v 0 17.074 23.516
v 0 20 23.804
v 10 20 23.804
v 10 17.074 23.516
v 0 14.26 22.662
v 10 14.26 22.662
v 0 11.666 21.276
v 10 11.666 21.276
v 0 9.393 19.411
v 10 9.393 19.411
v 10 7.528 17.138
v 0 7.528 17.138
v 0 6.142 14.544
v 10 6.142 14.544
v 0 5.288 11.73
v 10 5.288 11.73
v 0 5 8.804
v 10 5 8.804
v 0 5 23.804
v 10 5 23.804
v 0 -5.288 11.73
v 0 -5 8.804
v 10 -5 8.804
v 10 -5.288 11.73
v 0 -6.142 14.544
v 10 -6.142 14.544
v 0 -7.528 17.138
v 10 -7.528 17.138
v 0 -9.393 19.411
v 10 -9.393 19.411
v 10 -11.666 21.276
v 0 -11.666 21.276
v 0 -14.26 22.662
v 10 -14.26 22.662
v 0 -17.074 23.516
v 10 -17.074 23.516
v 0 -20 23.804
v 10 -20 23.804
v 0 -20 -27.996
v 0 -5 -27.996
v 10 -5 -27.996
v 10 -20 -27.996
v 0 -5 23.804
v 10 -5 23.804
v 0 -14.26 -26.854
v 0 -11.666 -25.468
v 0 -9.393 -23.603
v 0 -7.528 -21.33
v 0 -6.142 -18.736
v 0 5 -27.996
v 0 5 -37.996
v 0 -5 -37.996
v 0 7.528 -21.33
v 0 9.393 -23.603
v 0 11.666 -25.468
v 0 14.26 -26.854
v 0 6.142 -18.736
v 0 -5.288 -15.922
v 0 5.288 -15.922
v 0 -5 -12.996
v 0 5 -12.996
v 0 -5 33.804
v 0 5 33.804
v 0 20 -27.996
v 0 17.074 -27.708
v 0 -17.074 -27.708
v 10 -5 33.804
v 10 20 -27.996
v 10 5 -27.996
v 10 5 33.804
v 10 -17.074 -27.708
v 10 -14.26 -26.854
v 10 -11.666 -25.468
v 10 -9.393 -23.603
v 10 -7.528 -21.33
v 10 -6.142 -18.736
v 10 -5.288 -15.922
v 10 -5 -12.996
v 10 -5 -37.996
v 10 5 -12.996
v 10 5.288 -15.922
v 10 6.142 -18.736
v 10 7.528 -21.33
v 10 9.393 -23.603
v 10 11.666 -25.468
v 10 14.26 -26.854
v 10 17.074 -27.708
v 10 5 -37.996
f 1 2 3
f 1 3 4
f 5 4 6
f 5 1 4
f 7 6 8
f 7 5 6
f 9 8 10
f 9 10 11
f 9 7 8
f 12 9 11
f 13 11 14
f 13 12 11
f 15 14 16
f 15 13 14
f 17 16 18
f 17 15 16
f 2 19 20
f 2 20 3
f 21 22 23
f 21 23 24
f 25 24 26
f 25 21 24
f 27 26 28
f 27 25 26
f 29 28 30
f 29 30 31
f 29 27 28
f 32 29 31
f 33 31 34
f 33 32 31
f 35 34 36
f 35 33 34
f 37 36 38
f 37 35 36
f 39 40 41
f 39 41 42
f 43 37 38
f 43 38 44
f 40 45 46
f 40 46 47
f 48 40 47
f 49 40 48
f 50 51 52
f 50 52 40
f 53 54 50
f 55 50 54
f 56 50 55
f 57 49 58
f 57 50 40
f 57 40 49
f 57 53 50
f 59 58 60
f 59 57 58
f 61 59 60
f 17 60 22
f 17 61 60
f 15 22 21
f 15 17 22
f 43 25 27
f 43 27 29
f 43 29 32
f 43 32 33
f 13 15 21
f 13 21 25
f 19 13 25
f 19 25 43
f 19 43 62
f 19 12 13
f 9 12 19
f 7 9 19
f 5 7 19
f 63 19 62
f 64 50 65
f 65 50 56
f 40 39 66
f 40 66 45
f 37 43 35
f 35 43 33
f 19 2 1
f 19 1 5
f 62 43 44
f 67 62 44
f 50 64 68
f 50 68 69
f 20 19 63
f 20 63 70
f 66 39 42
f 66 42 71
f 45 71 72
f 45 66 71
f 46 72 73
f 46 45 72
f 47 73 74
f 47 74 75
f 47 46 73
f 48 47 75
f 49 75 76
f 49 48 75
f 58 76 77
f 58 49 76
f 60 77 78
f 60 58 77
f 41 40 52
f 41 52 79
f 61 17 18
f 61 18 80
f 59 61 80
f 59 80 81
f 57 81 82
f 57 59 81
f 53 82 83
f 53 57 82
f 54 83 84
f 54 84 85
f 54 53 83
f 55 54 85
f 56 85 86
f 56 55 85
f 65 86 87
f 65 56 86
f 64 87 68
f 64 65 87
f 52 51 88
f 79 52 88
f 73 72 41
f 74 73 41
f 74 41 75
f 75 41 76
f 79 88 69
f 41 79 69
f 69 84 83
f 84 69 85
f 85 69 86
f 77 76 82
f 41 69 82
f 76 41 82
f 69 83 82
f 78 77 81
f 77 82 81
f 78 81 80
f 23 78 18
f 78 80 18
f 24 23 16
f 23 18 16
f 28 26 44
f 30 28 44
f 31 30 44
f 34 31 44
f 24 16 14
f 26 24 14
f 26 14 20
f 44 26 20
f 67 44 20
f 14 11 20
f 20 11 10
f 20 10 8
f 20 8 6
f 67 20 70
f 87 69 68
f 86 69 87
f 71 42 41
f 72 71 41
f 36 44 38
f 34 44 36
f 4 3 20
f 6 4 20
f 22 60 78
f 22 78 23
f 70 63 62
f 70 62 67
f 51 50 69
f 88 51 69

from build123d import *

# Parameters (mm, degrees)
BOSS_EXTRUDE1_DEPTH = 10
SKETCH2_W           = 10
SKETCH2_H           = 10
BOSS_EXTRUDE2_DEPTH = 10


with BuildPart() as part:
    # Sketch1 → Boss-Extrude1 (new body)
    with BuildSketch(Plane(origin=(0, 0, 0), x_dir=(0, 0, -1), z_dir=(1, 0, 0))):
        with BuildLine():
            Line((-8.804034582, 5), (12.995965418, 5))
            ThreePointArc((12.995965418, 5), (23.602567136, 9.393398282), (27.995965418, 20))
            Line((27.995965418, 20), (27.995965418, -20))
            ThreePointArc((27.995965418, -20), (23.602567136, -9.393398282), (12.995965418, -5))
            Line((12.995965418, -5), (-8.804034582, -5))
            ThreePointArc((-8.804034582, -5), (-19.4106363, -9.393398282), (-23.804034582, -20))
            Line((-23.804034582, -20), (-23.804034582, 20))
            ThreePointArc((-23.804034582, 20), (-19.4106363, 9.393398282), (-8.804034582, 5))
        make_face()
    extrude(amount=BOSS_EXTRUDE1_DEPTH)

    # Sketch2 → Boss-Extrude2 (add)
    with BuildSketch(Plane.XY.offset(23.804034582)):
        with Locations((5, 0)):
            Rectangle(SKETCH2_W, SKETCH2_H)
    boss_extrude2 = extrude(amount=BOSS_EXTRUDE2_DEPTH)

    # Mirror1: Boss-Extrude2 across plane
    add(boss_extrude2.mirror(Plane(origin=(0, 0, -2.095965418), x_dir=(1, 0, 0), z_dir=(0, 0, -1))))


solid = part.part
